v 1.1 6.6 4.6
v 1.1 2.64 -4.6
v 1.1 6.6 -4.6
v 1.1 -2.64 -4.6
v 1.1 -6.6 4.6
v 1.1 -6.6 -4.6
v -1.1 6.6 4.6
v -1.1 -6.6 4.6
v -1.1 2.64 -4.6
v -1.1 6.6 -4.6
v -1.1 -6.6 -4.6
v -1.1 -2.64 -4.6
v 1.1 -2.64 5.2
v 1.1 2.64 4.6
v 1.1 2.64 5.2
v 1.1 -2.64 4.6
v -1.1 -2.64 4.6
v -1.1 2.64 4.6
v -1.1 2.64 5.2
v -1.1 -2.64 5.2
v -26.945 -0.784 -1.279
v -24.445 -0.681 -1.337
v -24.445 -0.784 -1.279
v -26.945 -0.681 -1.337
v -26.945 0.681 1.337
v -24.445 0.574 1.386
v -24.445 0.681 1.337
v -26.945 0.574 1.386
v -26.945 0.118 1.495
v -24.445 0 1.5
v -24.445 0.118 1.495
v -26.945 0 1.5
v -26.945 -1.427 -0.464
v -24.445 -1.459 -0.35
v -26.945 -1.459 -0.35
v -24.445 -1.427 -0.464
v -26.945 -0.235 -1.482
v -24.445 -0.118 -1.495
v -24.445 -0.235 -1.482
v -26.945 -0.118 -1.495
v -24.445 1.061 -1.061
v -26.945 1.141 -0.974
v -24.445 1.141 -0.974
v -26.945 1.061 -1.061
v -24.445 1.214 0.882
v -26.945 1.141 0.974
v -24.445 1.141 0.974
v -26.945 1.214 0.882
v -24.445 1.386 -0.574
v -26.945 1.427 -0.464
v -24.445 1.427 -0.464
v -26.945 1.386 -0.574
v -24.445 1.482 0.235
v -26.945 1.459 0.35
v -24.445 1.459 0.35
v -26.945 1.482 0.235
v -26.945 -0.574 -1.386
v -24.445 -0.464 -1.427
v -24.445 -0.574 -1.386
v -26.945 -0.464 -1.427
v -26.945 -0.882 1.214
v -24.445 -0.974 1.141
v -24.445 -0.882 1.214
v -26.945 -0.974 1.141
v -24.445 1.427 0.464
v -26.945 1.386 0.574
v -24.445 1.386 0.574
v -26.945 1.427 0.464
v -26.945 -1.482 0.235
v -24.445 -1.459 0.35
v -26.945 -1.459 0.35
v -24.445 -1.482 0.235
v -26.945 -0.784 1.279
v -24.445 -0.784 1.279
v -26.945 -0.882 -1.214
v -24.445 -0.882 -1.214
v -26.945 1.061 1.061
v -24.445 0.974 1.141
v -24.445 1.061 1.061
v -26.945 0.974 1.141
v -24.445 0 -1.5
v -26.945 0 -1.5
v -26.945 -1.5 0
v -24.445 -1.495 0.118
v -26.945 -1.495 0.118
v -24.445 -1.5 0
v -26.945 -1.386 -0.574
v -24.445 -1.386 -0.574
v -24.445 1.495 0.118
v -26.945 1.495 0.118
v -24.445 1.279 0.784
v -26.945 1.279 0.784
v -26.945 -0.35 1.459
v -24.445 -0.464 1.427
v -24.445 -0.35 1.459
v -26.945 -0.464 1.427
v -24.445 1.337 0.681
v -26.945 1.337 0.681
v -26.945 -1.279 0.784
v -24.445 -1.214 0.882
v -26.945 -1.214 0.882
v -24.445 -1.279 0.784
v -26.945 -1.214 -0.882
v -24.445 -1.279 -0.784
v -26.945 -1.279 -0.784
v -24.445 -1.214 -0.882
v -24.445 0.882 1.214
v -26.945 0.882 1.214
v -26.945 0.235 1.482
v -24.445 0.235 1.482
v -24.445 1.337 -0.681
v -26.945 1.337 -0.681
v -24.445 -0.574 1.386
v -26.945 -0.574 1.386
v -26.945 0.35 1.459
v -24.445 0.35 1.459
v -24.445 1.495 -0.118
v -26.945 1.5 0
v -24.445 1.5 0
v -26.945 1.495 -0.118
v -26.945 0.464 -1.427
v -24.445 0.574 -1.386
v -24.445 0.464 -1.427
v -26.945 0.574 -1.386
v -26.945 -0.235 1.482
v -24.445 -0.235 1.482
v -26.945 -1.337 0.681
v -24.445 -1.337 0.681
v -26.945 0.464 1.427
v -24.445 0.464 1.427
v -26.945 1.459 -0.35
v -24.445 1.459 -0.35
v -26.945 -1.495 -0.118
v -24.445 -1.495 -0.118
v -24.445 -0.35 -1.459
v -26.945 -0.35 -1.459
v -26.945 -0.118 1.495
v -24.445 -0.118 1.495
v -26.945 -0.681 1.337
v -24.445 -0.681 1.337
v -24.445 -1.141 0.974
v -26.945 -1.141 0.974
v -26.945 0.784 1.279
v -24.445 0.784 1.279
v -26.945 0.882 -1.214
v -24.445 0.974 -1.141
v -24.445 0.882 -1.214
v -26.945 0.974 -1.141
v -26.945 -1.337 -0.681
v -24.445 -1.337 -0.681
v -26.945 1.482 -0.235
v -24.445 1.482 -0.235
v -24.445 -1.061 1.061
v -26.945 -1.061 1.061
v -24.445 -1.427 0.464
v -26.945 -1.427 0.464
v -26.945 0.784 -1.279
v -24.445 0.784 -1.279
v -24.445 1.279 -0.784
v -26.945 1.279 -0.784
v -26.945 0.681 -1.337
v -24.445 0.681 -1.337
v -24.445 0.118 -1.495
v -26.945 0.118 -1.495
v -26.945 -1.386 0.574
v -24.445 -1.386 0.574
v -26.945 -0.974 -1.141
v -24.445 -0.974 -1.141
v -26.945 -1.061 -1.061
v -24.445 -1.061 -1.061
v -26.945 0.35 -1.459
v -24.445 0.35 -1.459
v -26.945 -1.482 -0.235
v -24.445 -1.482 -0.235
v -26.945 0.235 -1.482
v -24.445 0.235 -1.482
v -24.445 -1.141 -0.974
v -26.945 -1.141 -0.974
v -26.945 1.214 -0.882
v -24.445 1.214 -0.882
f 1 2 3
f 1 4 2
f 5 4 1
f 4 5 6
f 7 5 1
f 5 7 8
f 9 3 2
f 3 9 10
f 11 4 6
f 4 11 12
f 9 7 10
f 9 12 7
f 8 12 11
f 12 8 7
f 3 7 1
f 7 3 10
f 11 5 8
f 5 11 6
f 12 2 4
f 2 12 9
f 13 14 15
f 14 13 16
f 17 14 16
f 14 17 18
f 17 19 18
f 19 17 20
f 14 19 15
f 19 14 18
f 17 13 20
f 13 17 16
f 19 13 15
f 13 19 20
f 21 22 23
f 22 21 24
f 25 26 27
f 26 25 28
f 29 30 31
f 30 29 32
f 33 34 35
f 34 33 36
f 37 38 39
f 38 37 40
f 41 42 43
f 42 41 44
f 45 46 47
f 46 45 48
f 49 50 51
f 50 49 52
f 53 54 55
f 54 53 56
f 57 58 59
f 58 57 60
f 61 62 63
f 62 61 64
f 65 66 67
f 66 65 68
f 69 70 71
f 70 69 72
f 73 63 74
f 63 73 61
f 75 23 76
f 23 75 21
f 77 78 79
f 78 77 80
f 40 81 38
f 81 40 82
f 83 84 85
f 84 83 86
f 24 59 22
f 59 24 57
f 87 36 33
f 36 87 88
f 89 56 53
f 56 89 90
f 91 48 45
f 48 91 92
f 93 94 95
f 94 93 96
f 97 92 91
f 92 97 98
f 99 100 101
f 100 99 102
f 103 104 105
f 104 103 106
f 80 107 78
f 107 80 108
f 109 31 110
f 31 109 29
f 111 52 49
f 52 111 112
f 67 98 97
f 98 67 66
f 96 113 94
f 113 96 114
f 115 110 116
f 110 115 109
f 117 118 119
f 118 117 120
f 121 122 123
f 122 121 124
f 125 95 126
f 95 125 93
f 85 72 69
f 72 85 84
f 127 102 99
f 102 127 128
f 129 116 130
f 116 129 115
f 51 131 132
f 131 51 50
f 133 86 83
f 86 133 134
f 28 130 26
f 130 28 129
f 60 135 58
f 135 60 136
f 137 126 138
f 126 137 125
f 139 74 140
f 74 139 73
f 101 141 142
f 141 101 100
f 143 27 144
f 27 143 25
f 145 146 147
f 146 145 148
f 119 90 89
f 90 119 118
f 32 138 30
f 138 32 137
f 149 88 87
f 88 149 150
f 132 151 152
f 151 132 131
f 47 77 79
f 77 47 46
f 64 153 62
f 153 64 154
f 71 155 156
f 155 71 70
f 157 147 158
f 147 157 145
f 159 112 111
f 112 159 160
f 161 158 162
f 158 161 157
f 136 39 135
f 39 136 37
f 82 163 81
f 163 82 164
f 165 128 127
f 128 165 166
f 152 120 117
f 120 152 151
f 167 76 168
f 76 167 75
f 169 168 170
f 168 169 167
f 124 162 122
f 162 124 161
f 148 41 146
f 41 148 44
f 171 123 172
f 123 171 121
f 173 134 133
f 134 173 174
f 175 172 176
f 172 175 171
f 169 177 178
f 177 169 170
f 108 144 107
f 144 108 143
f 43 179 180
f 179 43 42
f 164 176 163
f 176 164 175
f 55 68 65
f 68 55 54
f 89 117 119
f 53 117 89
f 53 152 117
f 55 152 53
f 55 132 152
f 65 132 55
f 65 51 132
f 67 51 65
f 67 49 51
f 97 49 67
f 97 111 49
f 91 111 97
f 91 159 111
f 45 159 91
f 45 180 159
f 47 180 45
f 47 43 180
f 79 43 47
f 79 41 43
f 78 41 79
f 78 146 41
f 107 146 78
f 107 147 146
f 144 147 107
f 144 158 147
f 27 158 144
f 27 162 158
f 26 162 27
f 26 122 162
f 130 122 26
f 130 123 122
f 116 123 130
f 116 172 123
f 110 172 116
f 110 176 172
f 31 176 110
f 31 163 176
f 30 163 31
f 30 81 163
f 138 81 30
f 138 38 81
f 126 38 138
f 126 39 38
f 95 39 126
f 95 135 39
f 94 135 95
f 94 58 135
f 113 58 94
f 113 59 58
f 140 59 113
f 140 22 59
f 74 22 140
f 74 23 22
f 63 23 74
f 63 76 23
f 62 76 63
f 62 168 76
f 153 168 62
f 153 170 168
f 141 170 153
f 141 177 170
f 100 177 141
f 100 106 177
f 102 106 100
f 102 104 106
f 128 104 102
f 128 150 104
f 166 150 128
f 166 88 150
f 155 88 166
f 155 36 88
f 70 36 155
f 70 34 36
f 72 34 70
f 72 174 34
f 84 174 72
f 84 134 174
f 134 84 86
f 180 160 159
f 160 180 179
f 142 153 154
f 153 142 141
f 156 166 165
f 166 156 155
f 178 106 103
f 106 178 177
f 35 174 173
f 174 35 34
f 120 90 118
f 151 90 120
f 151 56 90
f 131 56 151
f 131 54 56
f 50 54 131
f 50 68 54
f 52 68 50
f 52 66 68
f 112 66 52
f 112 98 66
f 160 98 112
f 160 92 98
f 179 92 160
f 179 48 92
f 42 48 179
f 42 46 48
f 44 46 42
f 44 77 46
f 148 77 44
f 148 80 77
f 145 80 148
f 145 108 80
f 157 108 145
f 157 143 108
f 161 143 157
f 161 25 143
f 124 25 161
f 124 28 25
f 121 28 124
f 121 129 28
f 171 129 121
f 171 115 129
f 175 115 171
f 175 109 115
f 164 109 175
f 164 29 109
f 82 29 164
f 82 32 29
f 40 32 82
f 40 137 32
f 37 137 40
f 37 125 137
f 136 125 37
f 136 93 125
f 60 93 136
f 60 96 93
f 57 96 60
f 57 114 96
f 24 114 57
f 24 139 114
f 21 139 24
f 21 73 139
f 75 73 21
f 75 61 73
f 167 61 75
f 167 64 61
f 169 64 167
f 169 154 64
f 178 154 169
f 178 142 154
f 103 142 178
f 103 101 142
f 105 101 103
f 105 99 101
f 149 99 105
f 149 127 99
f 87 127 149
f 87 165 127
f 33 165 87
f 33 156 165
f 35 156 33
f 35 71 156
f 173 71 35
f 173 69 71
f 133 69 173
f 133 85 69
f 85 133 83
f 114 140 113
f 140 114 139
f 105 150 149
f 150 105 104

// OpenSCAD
// file: params.scad
// ============================================================
// DaPao Space Mouse — Shared Parameters & Utilities
// Include this file in all part files: include <params.scad>
// ============================================================

$fn = 80;

// Tolerances
tol        = 0.3;
print_tol  = 0.15;

// --- Base Dimensions ------------------------------------------
base_od       = 100;
base_id       = 94;
base_height   = 25;
base_wall     = 3;
base_floor    = 2;

plate_thick       = 3;
plate_screw_inset = 8;

// Steel insert pockets
steel_pocket_d     = 22;
steel_pocket_depth = 8;
steel_pocket_r     = 35;
steel_pocket_count = 4;

// USB-C port
usbc_width  = 9.5;
usbc_height = 3.5;
usbc_z      = 8;

// PCB mounting
pcb_standoff_h   = 5;
pcb_standoff_d   = 5;
pcb_screw_d      = 1.8;
pcb_mount_spread = 30;

// Rubber feet
foot_d     = 10;
foot_depth = 1;

// Assembly screws
assy_screw_d     = 2.2;
assy_screw_count = 4;
assy_screw_r     = 44;

// Power switch
sw_width  = 7;
sw_height = 4;
sw_z      = 18;
sw_angle  = 180;

// --- Body Dimensions ------------------------------------------
body_od_top      = 60;
body_od_bottom   = 60;
body_od_waist    = 44;
body_height      = 55;
body_wall        = 2.5;
body_waist_pos   = 0.45;
body_resolution  = 60;

tilt_clearance   = 6;
tilt_angle_max   = 18;

// --- Side Buttons (on body) -----------------------------------
side_btn_width    = 14;
side_btn_height   = 10;
side_btn_z_frac   = 0.78;
side_btn_depth    = 2;
side_btn_travel   = 1.5;

// --- Top Frame & Half-Circle Buttons --------------------------
top_frame_height  = 4;
top_frame_wall    = 3;
top_frame_lip     = 2;
top_frame_divider = 2;

top_btn_height    = 3;
top_btn_dome      = 2;
top_btn_clearance = 0.4;
top_btn_hinge_w   = 5;
top_btn_hinge_t   = 1.0;
top_btn_plunger_d = 3;
top_btn_plunger_h = 3;

top_sw_post_d     = 5;
top_sw_post_h     = 8;
top_sw_offset_y   = 10;

// --- Joystick Module ------------------------------------------
joy_base_w  = 25;
joy_base_d  = 25;
joy_base_h  = 10;
joy_stick_d = 5;
joy_stick_h = 18;
joy_travel  = 18;

// --- Joystick Coupler -----------------------------------------
coupler_od       = 20;
coupler_id       = joy_stick_d + 0.4;
coupler_height   = 15;
coupler_flange   = 30;
coupler_flange_h = 3;


// ============================================================
//                     HELPER FUNCTIONS
// ============================================================

// Concave body radius at height fraction t (0=bottom, 1=top)
function shell_r(t) =
    let(
        r_top    = body_od_top / 2,
        r_bot    = body_od_bottom / 2,
        r_waist  = body_od_waist / 2,
        r_lin    = r_bot + (r_top - r_bot) * t,
        envelope = sin(t * 180),
        max_depth = (r_bot + r_top)/2 - r_waist
    )
    r_lin - max_depth * pow(envelope, 1.3);


// ============================================================
//                     UTILITY MODULES
// ============================================================

module rounded_rect(w, l, h, r) {
    translate([0, 0, h/2])
        hull() {
            for (x = [-1, 1], y = [-1, 1])
                translate([x*(w/2-r), y*(l/2-r), 0])
                    cylinder(r=r, h=h, center=true);
        }
}

module rounded_slot(w, h, depth) {
    r = h / 2;
    hull() {
        translate([0, -(w/2 - r), 0]) cylinder(r=r, h=depth);
        translate([0,  (w/2 - r), 0]) cylinder(r=r, h=depth);
    }
}

module half_circle(r, h, side) {
    intersection() {
        cylinder(r=r, h=h);
        if (side < 0) {
            translate([-r, -r, 0]) cube([r, 2*r, h]);
        } else {
            translate([0, -r, 0]) cube([r, 2*r, h]);
        }
    }
}
// main file
// ============================================================
// DaPao Space Mouse — Part 7: Side Button Cap (v2)
// Curved cap fitting the body shell side cutouts.
// Fix: simplified to a solid curved block — no floating shell slivers.
// Fix: retention clips are now part of the solid block, not separate.
// Print: flat (inner) face down, print 2 copies.
// Qty: 2
// ============================================================
include <params.scad>

module side_button_cap() {
    r_at_height = shell_r(side_btn_z_frac);  // body outer radius at button height
    cap_w       = side_btn_width  - 2 * top_btn_clearance;
    cap_h       = side_btn_height - 2 * top_btn_clearance;
    cap_thick   = body_wall - 0.3;  // slightly thinner than wall for fit

    // Solid curved block matching body outer curvature
    intersection() {
        // Bounding box
        translate([-cap_thick / 2, -cap_w / 2, -cap_h / 2])
            cube([cap_thick, cap_w, cap_h]);

        // Cylindrical arc (outer face follows body curve)
        cylinder(r = r_at_height, h = cap_h, center = true);
    }

    // Retention nubs on top and bottom edges — keep cap seated in cutout
    for (z_s = [-1, 1]) {
        translate([0, 0, z_s * (cap_h / 2)])
            intersection() {
                translate([-cap_thick / 2, -cap_w * 0.2, 0])
                    cube([cap_thick, cap_w * 0.4, 1.2]);
                cylinder(r = r_at_height + 0.1, h = 1.2, center = true);
            }
    }

    // Inner nub — presses tactile switch mounted inside body
    // Protrudes inward (negative X from body outer surface)
    translate([-(r_at_height - cap_thick / 2), 0, 0])
        rotate([0, -90, 0])
            cylinder(d = top_btn_plunger_d, h = 2.5);
}

side_button_cap();
